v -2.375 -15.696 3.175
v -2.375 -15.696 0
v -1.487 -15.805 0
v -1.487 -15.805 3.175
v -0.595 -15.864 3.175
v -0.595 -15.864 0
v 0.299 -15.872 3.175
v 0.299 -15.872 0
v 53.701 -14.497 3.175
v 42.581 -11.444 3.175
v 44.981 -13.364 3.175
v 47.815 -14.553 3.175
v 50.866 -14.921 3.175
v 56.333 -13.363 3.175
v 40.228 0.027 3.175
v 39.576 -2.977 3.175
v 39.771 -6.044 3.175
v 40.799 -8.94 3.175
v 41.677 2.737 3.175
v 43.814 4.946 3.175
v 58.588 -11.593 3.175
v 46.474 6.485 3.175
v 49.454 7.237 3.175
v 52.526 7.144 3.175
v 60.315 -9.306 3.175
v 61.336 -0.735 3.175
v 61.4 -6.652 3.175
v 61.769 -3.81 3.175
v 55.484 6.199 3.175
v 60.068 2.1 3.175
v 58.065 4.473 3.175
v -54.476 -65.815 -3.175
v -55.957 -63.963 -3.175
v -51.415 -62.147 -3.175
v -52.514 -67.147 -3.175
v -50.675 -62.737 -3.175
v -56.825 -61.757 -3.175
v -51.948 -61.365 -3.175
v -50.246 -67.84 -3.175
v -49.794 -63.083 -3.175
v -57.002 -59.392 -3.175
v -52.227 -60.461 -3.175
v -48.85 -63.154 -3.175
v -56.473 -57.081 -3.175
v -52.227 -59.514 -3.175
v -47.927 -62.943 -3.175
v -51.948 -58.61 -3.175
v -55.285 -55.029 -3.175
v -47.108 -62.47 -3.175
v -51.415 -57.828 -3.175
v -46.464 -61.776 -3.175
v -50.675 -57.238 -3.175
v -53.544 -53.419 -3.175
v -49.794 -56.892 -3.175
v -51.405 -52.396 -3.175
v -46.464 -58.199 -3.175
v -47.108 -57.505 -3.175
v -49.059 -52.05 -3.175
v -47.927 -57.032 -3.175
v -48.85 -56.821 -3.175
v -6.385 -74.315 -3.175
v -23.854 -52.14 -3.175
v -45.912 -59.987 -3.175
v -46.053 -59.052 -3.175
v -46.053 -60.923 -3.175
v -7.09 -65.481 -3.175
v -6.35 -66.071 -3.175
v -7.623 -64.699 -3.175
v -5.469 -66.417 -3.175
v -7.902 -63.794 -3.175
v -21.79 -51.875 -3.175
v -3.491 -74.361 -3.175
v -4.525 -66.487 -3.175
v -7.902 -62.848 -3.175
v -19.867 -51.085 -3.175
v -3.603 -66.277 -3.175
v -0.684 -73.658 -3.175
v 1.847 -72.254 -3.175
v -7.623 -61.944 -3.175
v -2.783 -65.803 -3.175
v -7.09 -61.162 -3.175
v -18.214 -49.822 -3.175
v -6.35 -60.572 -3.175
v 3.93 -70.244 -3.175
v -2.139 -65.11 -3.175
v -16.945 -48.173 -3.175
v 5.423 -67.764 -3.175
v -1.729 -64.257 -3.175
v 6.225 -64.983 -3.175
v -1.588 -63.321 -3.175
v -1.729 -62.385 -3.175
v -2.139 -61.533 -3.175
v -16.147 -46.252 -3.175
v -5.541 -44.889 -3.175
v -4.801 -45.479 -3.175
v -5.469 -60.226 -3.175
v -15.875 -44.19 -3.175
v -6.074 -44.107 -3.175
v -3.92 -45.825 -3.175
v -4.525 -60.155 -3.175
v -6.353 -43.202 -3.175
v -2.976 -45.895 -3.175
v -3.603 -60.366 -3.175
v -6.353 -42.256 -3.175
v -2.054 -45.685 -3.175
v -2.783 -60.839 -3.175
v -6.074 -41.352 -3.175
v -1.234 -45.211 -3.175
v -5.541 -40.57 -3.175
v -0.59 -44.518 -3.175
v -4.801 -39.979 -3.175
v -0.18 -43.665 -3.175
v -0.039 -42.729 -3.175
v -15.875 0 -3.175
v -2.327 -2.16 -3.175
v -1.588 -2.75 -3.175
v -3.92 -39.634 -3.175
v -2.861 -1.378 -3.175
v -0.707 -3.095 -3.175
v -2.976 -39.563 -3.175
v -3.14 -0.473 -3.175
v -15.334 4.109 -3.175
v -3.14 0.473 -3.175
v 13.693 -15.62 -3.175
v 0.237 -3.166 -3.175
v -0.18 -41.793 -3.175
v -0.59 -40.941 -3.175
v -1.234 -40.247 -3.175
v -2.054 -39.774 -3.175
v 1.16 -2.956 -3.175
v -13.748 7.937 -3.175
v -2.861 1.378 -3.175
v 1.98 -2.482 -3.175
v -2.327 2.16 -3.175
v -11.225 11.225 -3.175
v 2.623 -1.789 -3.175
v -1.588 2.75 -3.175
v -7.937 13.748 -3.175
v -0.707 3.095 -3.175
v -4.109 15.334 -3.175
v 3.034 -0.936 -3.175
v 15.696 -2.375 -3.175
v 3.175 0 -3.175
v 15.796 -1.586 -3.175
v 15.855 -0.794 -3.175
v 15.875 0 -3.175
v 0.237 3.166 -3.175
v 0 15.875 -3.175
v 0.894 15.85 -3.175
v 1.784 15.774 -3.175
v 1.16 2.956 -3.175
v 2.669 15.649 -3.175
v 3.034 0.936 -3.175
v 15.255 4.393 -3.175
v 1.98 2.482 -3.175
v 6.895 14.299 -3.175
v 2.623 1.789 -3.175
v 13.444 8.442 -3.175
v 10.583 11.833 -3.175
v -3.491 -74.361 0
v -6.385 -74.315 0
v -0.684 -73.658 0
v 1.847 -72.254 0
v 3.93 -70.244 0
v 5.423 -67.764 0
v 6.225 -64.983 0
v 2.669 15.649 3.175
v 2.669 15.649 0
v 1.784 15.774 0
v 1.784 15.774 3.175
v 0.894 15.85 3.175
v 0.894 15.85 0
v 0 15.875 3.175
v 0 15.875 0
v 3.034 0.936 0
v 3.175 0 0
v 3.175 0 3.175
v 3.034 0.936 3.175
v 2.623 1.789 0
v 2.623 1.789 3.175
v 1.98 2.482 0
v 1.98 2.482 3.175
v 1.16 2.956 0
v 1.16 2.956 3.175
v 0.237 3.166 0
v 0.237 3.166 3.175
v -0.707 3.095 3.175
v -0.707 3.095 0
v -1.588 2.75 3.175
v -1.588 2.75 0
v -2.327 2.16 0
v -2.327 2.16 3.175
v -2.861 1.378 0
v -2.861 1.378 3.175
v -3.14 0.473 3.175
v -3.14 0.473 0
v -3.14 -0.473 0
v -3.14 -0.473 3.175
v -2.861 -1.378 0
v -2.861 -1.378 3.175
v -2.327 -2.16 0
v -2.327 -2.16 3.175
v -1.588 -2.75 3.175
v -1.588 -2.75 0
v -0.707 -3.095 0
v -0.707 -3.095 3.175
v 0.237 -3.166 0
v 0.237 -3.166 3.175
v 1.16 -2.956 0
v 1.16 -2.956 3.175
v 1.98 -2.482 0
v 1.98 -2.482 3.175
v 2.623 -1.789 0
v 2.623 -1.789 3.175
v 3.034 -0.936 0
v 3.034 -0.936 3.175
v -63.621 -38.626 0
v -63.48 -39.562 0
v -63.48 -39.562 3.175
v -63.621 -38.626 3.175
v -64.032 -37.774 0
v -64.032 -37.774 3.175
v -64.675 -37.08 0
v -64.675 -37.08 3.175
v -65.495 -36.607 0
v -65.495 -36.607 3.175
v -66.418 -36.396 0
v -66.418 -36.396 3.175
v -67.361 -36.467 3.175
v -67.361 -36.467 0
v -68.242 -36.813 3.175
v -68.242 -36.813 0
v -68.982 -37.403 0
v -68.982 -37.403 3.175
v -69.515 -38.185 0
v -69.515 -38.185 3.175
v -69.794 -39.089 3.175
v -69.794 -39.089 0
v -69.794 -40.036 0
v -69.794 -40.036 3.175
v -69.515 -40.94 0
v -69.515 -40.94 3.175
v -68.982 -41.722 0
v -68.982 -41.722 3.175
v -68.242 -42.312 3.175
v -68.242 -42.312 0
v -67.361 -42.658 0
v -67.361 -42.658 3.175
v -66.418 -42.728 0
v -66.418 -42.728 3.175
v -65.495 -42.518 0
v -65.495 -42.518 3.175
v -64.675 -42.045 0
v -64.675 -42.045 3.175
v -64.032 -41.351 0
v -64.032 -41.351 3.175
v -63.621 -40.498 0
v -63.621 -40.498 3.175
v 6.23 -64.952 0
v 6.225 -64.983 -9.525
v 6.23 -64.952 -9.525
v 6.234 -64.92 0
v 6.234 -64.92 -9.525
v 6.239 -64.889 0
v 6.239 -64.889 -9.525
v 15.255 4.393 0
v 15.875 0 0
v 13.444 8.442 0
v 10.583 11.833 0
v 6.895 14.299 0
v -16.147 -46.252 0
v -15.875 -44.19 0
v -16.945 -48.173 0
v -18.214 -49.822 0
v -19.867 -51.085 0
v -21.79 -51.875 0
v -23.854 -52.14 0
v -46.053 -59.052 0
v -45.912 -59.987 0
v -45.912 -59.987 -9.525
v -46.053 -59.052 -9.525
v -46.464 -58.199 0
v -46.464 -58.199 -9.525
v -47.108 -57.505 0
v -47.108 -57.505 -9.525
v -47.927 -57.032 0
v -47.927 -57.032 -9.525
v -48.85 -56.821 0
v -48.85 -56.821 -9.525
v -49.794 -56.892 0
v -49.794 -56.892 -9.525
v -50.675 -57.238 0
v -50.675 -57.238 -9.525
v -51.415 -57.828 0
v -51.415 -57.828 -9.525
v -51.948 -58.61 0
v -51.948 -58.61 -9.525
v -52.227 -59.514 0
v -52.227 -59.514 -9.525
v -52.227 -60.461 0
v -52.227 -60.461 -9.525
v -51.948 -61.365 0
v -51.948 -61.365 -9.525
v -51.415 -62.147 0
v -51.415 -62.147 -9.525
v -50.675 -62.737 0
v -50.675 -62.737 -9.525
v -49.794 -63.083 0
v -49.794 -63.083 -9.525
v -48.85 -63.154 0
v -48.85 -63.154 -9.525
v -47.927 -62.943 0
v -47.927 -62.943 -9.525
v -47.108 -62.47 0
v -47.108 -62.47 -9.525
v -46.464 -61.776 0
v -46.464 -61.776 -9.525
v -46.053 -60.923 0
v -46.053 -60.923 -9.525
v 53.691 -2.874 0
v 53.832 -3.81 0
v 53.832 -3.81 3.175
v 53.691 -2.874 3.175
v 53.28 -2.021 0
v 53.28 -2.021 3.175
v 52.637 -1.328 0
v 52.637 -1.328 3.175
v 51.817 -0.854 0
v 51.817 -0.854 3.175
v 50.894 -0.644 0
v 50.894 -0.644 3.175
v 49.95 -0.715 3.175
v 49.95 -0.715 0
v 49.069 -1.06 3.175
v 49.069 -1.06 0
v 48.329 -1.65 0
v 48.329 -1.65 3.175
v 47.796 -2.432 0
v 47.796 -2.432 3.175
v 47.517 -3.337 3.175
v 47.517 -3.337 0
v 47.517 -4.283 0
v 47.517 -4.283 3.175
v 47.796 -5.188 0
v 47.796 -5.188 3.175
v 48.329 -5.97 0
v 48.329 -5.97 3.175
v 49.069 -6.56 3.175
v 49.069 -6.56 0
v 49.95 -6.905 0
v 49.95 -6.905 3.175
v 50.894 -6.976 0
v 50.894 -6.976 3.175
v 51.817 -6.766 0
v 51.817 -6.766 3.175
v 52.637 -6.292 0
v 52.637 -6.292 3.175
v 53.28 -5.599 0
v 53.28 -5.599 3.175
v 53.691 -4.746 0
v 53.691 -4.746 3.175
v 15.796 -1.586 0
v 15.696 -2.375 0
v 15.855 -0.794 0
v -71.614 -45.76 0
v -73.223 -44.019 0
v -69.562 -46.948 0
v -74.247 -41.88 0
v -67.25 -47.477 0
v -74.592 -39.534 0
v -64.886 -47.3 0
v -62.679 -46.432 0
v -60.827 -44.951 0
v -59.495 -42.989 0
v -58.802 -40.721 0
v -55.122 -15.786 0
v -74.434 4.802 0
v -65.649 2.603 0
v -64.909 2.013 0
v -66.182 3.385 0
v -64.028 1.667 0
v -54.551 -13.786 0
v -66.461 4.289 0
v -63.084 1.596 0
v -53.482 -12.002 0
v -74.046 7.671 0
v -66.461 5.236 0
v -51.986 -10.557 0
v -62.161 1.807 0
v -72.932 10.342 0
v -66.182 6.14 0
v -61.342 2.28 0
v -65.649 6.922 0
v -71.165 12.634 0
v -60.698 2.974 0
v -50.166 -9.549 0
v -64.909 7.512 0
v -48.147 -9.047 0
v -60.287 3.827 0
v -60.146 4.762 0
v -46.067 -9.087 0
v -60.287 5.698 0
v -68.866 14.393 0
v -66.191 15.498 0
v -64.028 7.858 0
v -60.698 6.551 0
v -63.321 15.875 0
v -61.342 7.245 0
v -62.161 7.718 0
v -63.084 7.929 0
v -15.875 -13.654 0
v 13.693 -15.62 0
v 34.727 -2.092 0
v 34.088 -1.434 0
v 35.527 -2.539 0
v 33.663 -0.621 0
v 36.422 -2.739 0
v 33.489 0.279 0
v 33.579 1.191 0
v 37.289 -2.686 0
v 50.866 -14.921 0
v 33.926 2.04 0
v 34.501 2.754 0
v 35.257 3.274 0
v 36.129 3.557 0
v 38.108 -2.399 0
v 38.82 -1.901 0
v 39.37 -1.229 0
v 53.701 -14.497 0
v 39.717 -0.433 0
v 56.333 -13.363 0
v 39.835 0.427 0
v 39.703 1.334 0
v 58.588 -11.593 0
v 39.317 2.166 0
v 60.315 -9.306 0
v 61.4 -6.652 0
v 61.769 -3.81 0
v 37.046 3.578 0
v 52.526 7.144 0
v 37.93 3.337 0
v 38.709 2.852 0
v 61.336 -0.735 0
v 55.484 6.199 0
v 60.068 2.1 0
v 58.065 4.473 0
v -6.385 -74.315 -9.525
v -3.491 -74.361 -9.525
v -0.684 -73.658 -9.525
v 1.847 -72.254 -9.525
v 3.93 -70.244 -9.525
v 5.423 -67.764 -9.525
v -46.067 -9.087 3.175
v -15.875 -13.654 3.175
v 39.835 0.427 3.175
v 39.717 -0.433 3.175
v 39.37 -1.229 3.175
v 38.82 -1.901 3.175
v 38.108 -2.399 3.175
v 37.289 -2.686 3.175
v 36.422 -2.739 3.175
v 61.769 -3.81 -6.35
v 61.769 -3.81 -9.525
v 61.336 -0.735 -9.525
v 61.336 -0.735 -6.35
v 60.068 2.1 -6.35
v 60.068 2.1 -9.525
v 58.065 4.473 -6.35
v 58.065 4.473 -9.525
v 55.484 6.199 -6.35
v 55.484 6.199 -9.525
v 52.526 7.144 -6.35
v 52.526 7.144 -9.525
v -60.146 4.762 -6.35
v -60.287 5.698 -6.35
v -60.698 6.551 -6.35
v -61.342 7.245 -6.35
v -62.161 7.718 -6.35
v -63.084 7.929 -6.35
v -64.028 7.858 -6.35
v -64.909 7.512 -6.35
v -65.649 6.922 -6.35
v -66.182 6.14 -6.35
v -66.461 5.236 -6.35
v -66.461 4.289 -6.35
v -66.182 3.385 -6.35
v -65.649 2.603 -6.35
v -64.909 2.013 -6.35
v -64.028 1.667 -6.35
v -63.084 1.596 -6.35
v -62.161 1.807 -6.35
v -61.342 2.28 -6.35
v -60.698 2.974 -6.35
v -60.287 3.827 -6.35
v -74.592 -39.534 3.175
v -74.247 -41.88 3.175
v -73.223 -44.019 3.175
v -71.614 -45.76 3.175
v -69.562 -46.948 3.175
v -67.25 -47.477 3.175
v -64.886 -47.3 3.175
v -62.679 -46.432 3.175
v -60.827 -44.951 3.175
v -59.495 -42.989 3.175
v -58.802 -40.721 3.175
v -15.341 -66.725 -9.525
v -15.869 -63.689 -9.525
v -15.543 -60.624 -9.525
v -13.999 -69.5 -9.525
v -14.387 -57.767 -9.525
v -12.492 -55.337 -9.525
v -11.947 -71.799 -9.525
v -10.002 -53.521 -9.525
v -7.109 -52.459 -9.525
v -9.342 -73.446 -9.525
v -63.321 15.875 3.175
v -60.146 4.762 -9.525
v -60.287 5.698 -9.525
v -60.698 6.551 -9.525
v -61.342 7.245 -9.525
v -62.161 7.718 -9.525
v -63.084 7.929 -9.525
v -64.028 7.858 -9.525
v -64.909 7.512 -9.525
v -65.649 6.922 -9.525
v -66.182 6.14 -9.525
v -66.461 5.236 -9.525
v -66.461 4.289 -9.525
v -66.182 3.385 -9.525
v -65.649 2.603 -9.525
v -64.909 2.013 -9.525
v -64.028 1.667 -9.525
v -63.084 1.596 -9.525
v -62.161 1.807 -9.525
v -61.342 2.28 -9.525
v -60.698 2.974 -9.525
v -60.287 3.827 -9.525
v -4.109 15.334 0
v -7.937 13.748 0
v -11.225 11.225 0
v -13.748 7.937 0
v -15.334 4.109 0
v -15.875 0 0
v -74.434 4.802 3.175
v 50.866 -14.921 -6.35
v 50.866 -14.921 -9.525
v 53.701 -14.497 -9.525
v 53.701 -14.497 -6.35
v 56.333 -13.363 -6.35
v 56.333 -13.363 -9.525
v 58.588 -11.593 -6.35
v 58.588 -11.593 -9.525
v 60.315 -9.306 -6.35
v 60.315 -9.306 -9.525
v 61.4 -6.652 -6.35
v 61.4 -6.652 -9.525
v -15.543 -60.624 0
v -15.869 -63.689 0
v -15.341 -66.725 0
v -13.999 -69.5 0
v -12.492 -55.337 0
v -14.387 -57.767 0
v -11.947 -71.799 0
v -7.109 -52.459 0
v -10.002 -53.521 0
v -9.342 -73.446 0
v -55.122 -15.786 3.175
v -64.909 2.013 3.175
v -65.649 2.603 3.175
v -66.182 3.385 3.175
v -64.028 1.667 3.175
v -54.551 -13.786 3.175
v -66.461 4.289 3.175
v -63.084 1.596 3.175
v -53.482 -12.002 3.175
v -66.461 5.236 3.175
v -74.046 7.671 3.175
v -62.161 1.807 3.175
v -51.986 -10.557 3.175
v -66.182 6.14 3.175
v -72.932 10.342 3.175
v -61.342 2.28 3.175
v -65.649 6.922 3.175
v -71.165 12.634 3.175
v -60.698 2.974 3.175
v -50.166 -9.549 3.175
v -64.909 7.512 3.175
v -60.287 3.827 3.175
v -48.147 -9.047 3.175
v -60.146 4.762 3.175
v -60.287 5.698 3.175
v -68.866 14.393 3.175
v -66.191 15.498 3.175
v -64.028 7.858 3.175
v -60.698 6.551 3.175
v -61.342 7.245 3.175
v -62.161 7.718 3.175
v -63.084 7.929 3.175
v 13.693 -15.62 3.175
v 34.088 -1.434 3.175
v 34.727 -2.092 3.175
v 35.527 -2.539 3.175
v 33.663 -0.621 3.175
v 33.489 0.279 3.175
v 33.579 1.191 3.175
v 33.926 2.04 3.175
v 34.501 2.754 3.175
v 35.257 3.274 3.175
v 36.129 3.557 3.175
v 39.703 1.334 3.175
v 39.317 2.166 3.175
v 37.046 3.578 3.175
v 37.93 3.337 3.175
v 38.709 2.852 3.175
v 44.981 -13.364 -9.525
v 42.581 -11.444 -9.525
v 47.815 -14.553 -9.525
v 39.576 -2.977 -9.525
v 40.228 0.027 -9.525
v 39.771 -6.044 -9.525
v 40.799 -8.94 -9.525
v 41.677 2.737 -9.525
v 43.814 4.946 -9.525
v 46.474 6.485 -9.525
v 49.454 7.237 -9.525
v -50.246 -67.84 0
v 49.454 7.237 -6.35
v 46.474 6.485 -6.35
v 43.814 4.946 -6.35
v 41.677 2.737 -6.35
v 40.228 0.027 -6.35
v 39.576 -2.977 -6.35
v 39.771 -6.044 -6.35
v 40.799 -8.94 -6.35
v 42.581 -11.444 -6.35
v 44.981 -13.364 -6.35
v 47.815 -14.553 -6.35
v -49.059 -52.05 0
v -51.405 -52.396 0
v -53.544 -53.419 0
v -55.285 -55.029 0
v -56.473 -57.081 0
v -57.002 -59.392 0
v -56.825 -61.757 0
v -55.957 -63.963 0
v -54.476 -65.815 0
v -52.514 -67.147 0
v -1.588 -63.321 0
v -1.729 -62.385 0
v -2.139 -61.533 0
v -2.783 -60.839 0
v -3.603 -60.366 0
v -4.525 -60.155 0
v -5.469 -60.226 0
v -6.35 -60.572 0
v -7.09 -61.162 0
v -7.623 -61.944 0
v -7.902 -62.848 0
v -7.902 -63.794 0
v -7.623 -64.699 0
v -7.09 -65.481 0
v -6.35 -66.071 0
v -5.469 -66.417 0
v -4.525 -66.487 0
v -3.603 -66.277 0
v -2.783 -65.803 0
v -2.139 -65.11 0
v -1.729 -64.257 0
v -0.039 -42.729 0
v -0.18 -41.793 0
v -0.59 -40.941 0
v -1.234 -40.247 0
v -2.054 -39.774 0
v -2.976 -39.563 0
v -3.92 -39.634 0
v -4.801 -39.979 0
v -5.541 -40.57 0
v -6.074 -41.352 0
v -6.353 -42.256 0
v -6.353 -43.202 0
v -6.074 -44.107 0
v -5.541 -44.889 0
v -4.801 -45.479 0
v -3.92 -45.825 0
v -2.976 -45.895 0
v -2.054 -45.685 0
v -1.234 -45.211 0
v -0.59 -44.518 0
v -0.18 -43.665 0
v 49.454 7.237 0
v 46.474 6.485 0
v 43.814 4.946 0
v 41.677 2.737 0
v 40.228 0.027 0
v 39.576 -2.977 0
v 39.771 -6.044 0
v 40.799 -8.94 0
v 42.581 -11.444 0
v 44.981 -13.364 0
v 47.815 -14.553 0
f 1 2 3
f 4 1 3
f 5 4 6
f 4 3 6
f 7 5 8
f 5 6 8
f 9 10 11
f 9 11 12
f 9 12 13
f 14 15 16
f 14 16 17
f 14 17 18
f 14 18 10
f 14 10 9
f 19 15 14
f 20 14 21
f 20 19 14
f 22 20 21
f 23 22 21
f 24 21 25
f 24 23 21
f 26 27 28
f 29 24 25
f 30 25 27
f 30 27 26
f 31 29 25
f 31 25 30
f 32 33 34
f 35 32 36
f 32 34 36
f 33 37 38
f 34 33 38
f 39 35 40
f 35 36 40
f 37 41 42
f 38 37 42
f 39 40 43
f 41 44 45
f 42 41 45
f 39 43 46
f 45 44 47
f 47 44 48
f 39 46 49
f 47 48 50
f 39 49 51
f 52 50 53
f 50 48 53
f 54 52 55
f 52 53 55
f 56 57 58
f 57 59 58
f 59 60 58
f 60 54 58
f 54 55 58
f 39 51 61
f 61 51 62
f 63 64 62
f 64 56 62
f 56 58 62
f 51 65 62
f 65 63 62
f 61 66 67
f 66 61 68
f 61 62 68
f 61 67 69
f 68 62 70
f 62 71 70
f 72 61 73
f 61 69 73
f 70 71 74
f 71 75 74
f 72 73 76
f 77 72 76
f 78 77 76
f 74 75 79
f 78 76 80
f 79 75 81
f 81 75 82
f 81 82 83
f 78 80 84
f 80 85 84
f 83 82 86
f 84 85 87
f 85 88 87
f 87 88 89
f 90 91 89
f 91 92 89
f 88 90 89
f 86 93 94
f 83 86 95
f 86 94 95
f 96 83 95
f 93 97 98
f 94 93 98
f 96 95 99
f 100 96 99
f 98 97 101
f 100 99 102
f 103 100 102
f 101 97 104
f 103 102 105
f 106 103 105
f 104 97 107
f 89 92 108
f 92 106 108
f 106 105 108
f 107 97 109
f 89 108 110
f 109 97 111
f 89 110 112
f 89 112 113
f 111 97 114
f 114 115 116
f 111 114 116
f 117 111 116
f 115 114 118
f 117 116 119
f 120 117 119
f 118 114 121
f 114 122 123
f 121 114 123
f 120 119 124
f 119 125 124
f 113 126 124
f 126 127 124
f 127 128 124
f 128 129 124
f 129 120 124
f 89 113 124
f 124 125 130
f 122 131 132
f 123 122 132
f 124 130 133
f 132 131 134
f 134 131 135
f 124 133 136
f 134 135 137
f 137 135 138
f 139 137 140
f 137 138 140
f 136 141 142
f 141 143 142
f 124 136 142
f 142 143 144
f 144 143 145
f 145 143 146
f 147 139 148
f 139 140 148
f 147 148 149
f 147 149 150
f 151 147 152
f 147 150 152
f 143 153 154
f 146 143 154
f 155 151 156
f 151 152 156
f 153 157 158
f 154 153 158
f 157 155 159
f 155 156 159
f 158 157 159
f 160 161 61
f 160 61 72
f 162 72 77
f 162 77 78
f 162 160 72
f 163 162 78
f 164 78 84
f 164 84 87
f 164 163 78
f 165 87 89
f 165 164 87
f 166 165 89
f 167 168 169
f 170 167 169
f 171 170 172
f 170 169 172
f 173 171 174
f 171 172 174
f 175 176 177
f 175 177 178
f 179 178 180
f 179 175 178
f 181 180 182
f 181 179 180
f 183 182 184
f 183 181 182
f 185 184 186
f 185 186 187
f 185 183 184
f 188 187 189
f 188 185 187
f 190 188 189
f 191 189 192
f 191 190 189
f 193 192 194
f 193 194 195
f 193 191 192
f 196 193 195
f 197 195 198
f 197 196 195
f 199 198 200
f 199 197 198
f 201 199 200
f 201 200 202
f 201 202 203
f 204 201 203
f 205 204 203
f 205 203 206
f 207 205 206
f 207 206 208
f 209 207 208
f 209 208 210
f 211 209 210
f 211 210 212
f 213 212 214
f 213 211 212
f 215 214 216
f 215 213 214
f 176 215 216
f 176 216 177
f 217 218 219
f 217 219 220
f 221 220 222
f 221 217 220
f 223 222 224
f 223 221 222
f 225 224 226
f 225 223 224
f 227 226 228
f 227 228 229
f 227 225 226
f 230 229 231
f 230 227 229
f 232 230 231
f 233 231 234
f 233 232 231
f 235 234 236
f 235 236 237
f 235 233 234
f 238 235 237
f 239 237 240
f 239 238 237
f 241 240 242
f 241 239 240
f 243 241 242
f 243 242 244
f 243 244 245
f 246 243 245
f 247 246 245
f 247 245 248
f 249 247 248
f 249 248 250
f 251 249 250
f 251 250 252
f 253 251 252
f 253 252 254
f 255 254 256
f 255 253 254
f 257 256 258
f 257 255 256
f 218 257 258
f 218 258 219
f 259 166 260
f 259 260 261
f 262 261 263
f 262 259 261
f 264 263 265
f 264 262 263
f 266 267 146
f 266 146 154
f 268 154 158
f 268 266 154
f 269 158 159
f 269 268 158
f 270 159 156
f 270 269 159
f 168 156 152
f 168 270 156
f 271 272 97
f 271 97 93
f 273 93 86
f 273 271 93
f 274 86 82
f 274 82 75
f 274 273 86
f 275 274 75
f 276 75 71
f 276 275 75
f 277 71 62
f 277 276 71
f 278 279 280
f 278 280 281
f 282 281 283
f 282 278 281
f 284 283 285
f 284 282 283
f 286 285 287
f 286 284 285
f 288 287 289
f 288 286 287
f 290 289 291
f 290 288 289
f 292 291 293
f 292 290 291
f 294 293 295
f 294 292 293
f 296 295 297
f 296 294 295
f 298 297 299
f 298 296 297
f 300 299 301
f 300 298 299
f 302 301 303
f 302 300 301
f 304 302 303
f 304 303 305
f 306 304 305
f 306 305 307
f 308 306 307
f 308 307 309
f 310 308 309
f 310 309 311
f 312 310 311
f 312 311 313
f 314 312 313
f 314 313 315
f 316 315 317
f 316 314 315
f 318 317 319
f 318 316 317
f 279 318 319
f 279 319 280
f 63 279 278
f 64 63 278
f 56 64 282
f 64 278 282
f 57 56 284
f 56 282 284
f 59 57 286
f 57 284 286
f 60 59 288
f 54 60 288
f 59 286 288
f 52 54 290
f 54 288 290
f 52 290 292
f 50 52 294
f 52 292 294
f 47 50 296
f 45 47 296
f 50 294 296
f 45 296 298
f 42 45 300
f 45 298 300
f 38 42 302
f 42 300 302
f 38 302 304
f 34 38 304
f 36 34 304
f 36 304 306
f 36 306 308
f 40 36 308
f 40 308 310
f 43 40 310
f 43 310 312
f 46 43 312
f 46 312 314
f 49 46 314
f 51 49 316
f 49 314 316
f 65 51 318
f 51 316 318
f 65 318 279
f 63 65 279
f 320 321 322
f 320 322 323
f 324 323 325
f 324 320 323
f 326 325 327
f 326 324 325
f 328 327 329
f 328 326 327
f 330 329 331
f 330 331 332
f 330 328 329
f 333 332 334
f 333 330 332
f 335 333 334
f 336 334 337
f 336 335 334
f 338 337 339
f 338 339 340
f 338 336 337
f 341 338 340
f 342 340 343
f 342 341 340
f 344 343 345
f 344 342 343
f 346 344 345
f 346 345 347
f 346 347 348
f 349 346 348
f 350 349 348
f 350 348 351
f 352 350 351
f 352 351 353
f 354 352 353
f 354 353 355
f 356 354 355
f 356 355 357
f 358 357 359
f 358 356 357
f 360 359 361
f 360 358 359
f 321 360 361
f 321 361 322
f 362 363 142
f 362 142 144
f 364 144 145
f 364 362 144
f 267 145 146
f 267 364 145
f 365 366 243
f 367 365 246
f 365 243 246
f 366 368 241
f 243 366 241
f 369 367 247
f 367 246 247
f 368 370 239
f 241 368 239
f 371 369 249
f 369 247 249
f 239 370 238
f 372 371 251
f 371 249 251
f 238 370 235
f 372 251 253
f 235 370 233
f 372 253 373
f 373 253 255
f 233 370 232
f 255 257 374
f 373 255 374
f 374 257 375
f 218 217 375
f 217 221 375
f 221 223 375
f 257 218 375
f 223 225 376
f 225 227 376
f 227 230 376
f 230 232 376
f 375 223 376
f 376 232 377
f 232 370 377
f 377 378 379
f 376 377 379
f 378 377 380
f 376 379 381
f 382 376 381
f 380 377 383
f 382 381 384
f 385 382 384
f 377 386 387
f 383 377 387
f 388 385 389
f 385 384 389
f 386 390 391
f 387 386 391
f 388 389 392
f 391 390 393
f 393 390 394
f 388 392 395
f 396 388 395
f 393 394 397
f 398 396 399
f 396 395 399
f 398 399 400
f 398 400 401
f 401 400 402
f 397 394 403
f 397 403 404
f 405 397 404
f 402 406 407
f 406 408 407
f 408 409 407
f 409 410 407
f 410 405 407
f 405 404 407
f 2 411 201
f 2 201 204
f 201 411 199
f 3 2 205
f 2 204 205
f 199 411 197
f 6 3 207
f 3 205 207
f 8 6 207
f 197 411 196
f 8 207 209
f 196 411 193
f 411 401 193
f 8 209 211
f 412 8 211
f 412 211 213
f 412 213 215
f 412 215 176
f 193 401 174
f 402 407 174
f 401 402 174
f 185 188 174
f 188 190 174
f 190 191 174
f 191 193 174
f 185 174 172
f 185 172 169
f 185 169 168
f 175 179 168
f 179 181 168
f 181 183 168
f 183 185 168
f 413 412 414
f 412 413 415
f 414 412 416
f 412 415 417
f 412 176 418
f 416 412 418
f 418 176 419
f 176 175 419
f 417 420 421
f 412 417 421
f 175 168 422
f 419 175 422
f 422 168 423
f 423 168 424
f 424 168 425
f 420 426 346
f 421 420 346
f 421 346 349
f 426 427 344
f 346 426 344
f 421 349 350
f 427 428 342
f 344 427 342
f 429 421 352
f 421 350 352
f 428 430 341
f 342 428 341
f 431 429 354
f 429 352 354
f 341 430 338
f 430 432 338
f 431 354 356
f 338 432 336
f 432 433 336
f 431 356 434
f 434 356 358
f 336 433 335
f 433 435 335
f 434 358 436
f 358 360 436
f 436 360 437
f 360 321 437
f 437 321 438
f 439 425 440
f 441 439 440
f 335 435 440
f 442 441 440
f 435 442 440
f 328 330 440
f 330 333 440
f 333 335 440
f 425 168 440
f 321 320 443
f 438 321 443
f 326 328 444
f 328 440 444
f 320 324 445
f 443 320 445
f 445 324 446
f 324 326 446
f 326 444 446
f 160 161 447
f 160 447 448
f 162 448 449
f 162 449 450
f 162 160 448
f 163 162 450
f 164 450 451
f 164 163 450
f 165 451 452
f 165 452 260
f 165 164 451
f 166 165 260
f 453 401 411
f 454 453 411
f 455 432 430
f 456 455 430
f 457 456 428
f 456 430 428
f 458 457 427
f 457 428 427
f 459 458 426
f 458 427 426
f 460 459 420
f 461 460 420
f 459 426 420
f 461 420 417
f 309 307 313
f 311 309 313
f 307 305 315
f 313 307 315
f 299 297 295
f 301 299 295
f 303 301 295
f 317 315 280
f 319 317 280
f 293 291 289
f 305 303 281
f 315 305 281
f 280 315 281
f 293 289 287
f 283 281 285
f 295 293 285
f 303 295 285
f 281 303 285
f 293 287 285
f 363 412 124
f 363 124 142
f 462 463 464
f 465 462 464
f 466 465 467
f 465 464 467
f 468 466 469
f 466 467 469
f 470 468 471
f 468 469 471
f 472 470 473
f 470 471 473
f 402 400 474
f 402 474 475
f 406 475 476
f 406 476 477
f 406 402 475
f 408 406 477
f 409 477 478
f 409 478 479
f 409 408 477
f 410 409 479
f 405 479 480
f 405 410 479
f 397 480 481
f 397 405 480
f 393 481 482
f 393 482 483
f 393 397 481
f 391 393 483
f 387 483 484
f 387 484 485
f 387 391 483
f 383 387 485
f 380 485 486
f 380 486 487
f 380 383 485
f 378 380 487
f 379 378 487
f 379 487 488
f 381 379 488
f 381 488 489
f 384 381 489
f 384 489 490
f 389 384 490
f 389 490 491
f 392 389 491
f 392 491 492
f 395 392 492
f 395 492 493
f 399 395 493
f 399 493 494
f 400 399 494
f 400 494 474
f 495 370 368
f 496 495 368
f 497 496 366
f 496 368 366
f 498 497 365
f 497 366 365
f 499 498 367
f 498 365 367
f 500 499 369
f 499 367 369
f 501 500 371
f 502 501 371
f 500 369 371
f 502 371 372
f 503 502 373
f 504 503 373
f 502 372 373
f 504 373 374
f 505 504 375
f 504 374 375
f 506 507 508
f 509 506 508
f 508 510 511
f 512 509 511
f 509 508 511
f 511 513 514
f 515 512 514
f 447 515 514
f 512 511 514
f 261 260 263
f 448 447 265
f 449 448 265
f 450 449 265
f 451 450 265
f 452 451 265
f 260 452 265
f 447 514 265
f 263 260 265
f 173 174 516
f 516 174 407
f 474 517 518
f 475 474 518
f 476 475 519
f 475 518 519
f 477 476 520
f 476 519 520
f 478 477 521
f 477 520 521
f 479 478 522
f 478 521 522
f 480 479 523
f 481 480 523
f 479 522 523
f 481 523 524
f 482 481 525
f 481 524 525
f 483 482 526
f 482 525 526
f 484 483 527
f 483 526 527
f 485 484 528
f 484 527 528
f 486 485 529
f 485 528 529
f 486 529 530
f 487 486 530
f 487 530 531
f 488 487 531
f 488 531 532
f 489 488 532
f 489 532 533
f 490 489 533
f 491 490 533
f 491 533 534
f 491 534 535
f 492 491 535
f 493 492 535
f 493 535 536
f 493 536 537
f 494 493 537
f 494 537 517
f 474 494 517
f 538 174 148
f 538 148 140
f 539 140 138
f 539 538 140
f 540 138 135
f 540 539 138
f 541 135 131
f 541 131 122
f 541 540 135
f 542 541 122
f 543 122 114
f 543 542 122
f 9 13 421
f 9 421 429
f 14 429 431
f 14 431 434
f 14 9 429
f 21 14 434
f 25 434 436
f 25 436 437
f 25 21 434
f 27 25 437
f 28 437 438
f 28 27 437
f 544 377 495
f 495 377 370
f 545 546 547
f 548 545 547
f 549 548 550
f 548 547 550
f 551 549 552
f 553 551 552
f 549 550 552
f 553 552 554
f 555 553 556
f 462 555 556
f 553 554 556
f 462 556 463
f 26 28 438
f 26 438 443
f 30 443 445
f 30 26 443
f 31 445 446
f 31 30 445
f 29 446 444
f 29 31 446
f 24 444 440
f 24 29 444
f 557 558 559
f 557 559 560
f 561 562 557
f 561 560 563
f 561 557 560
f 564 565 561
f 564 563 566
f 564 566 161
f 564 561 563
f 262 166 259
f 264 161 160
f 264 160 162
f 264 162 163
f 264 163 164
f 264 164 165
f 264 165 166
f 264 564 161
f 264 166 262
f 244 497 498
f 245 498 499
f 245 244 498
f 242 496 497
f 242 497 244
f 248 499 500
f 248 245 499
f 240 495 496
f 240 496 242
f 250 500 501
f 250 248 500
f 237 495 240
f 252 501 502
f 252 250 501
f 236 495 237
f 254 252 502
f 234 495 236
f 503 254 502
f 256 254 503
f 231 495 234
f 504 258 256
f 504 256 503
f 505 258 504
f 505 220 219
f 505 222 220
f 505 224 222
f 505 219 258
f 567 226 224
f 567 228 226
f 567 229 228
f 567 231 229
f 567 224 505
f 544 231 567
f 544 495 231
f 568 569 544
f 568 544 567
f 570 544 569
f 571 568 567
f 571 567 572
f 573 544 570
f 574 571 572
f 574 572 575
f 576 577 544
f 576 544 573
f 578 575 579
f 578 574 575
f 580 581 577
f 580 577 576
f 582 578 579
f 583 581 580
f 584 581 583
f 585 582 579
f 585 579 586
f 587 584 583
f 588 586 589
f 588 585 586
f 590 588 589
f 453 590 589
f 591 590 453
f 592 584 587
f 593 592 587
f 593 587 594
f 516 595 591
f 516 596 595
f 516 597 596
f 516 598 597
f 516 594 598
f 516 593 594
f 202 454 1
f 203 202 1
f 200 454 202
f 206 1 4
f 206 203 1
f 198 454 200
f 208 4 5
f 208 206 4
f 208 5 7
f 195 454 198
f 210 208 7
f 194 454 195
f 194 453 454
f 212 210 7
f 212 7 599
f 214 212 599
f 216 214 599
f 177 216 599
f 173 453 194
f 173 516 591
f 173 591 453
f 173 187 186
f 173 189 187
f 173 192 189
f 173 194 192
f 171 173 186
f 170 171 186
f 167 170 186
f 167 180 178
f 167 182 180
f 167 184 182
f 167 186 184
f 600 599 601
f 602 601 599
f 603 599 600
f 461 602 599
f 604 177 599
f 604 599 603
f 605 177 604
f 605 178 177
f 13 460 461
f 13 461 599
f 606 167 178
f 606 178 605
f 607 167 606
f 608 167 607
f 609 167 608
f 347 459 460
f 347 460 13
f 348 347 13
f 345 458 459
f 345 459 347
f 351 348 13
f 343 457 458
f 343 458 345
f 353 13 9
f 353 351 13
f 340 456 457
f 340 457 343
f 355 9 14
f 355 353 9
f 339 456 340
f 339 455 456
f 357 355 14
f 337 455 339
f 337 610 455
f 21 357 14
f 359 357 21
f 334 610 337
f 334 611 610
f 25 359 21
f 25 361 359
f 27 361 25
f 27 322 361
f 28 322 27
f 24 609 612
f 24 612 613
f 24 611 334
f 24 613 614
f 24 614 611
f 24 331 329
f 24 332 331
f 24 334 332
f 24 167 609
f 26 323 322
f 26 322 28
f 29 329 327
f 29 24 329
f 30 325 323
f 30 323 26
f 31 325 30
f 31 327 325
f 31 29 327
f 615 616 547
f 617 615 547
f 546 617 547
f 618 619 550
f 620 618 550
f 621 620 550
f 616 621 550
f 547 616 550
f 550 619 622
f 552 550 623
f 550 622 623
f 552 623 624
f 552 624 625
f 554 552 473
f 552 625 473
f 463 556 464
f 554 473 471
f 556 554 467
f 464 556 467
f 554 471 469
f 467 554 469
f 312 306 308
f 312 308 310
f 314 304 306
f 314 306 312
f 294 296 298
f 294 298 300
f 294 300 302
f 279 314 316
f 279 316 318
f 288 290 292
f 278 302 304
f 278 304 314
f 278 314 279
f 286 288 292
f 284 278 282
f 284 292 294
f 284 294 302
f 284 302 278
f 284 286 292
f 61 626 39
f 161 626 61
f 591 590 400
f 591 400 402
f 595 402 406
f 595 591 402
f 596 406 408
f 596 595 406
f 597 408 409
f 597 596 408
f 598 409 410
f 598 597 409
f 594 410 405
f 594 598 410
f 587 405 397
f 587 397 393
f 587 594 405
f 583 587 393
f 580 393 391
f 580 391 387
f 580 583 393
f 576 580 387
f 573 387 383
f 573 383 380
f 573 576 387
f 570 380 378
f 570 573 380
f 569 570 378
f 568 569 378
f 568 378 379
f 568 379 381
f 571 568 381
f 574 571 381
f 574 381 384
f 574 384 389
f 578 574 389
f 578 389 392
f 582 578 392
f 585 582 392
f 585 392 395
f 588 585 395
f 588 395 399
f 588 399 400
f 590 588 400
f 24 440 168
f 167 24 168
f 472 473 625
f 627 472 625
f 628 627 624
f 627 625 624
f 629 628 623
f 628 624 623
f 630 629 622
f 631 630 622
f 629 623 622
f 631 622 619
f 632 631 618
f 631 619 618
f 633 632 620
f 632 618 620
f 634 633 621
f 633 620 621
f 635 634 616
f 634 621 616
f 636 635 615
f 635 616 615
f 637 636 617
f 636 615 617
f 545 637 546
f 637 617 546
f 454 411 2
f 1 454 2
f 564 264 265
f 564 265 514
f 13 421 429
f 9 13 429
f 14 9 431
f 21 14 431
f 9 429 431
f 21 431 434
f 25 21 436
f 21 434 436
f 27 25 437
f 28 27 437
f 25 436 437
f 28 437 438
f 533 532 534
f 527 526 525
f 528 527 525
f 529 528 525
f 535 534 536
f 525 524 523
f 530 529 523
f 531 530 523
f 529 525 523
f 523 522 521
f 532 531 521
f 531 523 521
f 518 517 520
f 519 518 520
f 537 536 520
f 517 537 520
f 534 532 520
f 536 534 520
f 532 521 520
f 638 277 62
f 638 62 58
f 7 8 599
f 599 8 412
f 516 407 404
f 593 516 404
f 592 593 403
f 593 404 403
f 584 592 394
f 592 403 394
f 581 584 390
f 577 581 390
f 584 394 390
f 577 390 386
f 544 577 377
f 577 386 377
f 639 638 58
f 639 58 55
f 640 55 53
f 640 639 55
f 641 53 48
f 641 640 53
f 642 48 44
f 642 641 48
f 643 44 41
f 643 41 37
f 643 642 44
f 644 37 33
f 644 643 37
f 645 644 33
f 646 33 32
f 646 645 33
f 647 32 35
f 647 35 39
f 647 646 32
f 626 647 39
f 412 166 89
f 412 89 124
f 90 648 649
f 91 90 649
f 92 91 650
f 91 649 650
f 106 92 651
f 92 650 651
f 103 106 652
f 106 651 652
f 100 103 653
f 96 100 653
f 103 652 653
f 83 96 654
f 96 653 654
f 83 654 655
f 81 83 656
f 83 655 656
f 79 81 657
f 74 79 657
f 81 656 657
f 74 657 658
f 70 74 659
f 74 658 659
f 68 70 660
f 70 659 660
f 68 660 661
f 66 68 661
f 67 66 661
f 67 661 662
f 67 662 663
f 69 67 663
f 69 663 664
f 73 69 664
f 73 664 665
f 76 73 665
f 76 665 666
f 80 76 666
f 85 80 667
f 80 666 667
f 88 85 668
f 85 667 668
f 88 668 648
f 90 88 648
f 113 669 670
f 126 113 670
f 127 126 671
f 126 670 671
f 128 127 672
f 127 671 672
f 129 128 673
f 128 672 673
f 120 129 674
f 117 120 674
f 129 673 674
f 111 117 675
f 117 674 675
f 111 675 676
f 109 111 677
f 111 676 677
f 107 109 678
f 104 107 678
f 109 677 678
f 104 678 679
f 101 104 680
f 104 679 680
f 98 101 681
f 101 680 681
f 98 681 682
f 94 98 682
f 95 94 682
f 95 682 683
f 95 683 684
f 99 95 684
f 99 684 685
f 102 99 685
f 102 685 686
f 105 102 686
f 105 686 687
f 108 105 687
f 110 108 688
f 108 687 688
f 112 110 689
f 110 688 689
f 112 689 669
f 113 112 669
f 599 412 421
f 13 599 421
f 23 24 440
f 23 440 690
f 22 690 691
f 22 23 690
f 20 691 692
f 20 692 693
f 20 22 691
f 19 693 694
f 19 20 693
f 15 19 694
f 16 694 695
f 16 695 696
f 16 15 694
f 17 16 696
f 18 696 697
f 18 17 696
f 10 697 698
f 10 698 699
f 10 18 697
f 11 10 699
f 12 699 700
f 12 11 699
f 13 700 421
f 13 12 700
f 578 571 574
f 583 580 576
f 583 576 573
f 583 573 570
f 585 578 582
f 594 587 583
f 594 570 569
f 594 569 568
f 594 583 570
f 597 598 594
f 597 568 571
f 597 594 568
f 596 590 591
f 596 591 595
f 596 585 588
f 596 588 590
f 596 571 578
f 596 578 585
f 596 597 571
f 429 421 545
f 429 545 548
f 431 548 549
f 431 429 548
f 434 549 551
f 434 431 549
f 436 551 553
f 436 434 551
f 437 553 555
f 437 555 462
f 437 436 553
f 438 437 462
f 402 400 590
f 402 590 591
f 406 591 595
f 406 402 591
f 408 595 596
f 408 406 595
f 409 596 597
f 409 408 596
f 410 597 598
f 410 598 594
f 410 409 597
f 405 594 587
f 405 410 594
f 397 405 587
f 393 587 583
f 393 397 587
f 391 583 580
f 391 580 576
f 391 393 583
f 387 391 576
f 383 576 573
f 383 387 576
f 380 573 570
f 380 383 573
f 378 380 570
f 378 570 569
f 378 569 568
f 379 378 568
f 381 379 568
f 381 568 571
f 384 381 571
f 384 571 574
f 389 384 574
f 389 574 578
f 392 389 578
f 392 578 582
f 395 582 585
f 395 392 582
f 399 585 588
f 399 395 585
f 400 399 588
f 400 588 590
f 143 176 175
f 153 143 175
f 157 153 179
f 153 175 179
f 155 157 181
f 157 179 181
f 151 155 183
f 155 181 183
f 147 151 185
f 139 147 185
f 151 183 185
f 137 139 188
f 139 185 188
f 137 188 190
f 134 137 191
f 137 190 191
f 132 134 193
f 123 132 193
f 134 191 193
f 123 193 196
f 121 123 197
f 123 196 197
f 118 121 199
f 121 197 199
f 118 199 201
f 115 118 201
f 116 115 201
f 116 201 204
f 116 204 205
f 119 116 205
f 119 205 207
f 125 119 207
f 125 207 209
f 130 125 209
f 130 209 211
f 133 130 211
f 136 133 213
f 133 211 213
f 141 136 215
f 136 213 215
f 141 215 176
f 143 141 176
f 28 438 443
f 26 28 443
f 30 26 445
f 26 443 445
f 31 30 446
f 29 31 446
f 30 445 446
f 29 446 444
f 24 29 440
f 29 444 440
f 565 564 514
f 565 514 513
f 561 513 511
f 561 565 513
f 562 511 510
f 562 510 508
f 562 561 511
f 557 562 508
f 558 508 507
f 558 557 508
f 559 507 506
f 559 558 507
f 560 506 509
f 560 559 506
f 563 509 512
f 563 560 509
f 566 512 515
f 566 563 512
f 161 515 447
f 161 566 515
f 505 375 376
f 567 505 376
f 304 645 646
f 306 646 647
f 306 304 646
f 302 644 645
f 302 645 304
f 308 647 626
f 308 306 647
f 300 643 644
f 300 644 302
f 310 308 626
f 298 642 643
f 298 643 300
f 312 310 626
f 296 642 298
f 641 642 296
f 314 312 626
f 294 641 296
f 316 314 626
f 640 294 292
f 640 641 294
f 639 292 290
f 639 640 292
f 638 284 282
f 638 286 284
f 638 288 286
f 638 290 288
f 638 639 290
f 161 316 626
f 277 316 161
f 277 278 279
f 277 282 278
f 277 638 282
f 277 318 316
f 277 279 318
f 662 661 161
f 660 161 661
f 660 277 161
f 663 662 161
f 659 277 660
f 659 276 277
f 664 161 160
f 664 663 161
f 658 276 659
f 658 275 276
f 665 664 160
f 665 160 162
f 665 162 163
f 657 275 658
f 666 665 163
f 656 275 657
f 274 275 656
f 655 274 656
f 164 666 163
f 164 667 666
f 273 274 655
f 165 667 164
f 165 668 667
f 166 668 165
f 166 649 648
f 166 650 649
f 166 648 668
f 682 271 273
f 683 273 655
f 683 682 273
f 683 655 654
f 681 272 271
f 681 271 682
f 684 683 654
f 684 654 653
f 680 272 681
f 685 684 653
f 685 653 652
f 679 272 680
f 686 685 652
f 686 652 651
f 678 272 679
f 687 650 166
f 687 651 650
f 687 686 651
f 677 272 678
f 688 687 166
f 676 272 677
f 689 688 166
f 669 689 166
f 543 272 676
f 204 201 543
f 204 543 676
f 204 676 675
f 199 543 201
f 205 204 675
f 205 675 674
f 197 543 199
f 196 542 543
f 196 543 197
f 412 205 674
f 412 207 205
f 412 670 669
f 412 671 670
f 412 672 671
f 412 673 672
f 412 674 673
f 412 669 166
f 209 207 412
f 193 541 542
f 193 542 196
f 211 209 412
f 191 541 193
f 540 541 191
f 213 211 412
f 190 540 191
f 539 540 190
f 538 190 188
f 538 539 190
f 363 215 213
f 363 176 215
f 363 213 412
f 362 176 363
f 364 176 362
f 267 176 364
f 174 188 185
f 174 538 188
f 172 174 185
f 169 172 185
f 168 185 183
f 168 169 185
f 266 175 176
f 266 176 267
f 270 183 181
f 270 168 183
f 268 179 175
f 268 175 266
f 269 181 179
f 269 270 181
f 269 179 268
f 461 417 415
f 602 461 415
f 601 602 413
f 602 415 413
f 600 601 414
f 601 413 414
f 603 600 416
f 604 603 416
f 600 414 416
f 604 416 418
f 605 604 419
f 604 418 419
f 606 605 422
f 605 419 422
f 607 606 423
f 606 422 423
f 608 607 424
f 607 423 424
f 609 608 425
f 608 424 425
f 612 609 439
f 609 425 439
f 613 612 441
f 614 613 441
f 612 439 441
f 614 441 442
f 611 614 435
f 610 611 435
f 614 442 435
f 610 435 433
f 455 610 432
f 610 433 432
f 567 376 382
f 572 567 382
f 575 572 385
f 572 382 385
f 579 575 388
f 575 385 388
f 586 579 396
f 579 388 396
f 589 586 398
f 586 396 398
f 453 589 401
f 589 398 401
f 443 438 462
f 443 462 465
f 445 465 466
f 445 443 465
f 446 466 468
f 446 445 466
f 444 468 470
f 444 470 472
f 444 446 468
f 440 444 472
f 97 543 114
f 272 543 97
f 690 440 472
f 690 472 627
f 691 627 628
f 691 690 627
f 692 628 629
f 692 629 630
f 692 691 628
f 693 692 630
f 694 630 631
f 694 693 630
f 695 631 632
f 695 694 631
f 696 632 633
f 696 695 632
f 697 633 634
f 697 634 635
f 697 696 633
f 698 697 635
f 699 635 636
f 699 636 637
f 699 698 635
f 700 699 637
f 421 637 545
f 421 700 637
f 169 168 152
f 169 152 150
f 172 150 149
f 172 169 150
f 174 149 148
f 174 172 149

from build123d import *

# Parameters (mm, degrees)
F0_R     = 3.175
F1_DEPTH = 3.175
F2_DEPTH = 3.175
F4_R     = 3.175
F6_DEPTH = 9.525
F3_R     = 3.175


# Not quite as in the source:
# - a pattern or mirror of a feature is missing from the dataset's text; its kind, count and spacing are read off the source's solid


with BuildPart() as f1:
    # F0 (on Top) → F1 (new body)
    with BuildSketch(Plane.XY):
        with BuildLine():
            ThreePointArc((-15.875, 0), (-11.2253201513, 11.2253201513), (0, 15.875))
            Line((0, 15.875), (-63.3211543937, 15.875))
            ThreePointArc((-63.3211543937, 15.875), (-55.4634302878, 12.6202241059), (-52.2086543937, 4.7625))
            ThreePointArc((-52.2086543937, 4.7625), (-63.3410515432, -6.3499821869), (-74.4335831412, 4.8022942352))
            Line((-74.4335831412, 4.8022942352), (-74.5923534991, -39.5338836219))
            ThreePointArc((-74.5923534991, -39.5338836219), (-66.6406921441, -31.6248207993), (-58.7174043937, -39.5623080756))
            ThreePointArc((-58.7174043937, -39.5623080756), (-58.7387068636, -40.1434474), (-58.8024999312, -40.7214674292))
            Line((-58.8024999312, -40.7214674292), (-55.1216121776, -15.7863113327))
            ThreePointArc((-55.1216121776, -15.7863113327), (-51.9856201231, -10.5565144679), (-46.0674725884, -9.0865650912))
            Line((-46.0674725884, -9.0865650912), (-15.875, -13.6540649408))
            Line((-15.875, -13.6540649408), (-15.875, 0))
        make_face()
        with BuildLine():
            ThreePointArc((-52.2086543937, 4.7625), (-55.4634302878, 12.6202241059), (-63.3211543937, 15.875))
            ThreePointArc((-63.3211543937, 15.875), (-71.1647964945, 12.6342809195), (-74.4335831412, 4.8022942352))
            ThreePointArc((-74.4335831412, 4.8022942352), (-63.3410515432, -6.3499821869), (-52.2086543937, 4.7625))
        make_face()
        with Locations((-63.3211543937, 4.7625)):
            Circle(F0_R, mode=Mode.SUBTRACT)
        with BuildLine():
            ThreePointArc((15.69640625, -2.3745432898), (15.8302885984, -1.190625), (15.875, 0))
            ThreePointArc((15.875, 0), (12.1324662265, 10.238109604), (2.6694707699, 15.6489472748))
            ThreePointArc((2.6694707699, 15.6489472748), (1.3395124137, 15.8183858688), (0, 15.875))
            ThreePointArc((0, 15.875), (-11.2253201513, 11.2253201513), (-15.875, 0))
            ThreePointArc((-15.875, 0), (-12.0356034274, -10.3518054047), (-2.3745432898, -15.69640625))
            ThreePointArc((-2.3745432898, -15.69640625), (-1.0416321888, -15.8407899861), (0.2987083423, -15.8721894623))
            ThreePointArc((0.2987083423, -15.8721894623), (10.4645848343, -11.9376752027), (15.69640625, -2.3745432898))
        make_face()
        Circle(F0_R, mode=Mode.SUBTRACT)
        with BuildLine():
            ThreePointArc((61.769423515, -3.81), (59.1496498735, 3.3566767228), (52.5255530539, 7.1442630923))
            ThreePointArc((52.5255530539, 7.1442630923), (39.5757214961, -2.9765625), (50.8660193546, -14.9205326236))
            ThreePointArc((50.8660193546, -14.9205326236), (58.5882296422, -11.5934464966), (61.769423515, -3.81))
        make_face()
        with Locations((50.656923515, -3.81)):
            Circle(F0_R, mode=Mode.SUBTRACT)
        with BuildLine():
            ThreePointArc((2.6694707699, 15.6489472748), (12.1324662265, 10.238109604), (15.875, 0))
            ThreePointArc((15.875, 0), (15.8302885984, -1.190625), (15.69640625, -2.3745432898))
            Line((15.69640625, -2.3745432898), (13.6926228472, -15.6201212767))
            Line((13.6926228472, -15.6201212767), (50.8660193546, -14.9205326236))
            ThreePointArc((50.8660193546, -14.9205326236), (39.5757214961, -2.9765625), (52.5255530539, 7.1442630923))
            Line((52.5255530539, 7.1442630923), (2.6694707699, 15.6489472748))
        make_face()
        with BuildLine():
            ThreePointArc((36.4223280073, -2.73939), (34.501219564, 2.7543996496), (39.8354530073, 0.4266677197))
            ThreePointArc((39.8354530073, 0.4266677197), (38.8196864505, -1.9010642102), (36.4223280073, -2.73939))
        make_face(mode=Mode.SUBTRACT)
        with BuildLine():
            Line((13.6926228472, -15.6201212767), (15.69640625, -2.3745432898))
            ThreePointArc((15.69640625, -2.3745432898), (10.4645848343, -11.9376752027), (0.2987083423, -15.8721894623))
            Line((0.2987083423, -15.8721894623), (13.6926228472, -15.6201212767))
        make_face()
        with BuildLine():
            ThreePointArc((-2.3745432898, -15.69640625), (-12.0356034274, -10.3518054047), (-15.875, 0))
            Line((-15.875, 0), (-15.875, -13.6540649408))
            Line((-15.875, -13.6540649408), (-2.3745432898, -15.69640625))
        make_face()
        with BuildLine():
            ThreePointArc((-58.7174043937, -39.5623080756), (-66.6406921441, -31.6248207993), (-74.5923534991, -39.5338836219))
            ThreePointArc((-74.5923534991, -39.5338836219), (-67.2502168937, -47.4774523748), (-58.8024999312, -40.7214674292))
            ThreePointArc((-58.8024999312, -40.7214674292), (-58.7387068636, -40.1434474), (-58.7174043937, -39.5623080756))
        make_face()
        with Locations((-66.6549043937, -39.5623080756)):
            Circle(F0_R, mode=Mode.SUBTRACT)
    extrude(amount=F1_DEPTH)


with BuildPart() as f2:
    # F0 (on Top) → F2 (new body)
    with BuildSketch(Plane.XY):
        with BuildLine():
            Line((13.6926228472, -15.6201212767), (0.2987083423, -15.8721894623))
            ThreePointArc((0.2987083423, -15.8721894623), (-1.0416321888, -15.8407899861), (-2.3745432898, -15.69640625))
            Line((-2.3745432898, -15.69640625), (-15.875, -13.6540649408))
            Line((-15.875, -13.6540649408), (-15.875, -44.1900675587))
            ThreePointArc((-15.875, -44.1900675587), (-18.213634337, -49.8217645365), (-23.8536699328, -52.1402165826))
            Line((-23.8536699328, -52.1402165826), (-49.0588836219, -52.0499552883))
            ThreePointArc((-49.0588836219, -52.0499552883), (-43.4646074188, -54.3848028931), (-41.1498080756, -59.9874043937))
            ThreePointArc((-41.1498080756, -59.9874043937), (-43.9006386779, -65.9959289055), (-50.2464674292, -67.8398088562))
            Line((-50.2464674292, -67.8398088562), (-6.385323095, -74.3145206412))
            ThreePointArc((-6.385323095, -74.3145206412), (-12.0238371567, -54.9092200771), (6.35, -63.3211543937))
            ThreePointArc((6.35, -63.3211543937), (6.3187020189, -64.1545918937), (6.224984375, -64.9833346965))
            Line((6.224984375, -64.9833346965), (13.6926228472, -15.6201212767))
        make_face()
        with Locations((-3.213735, -42.7291149849)):
            Circle(F0_R, mode=Mode.SUBTRACT)
        with BuildLine():
            ThreePointArc((-49.0588836219, -52.0499552883), (-57.0024523748, -59.3920918937), (-50.2464674292, -67.8398088562))
            ThreePointArc((-50.2464674292, -67.8398088562), (-43.9006386779, -65.9959289055), (-41.1498080756, -59.9874043937))
            ThreePointArc((-41.1498080756, -59.9874043937), (-43.4646074188, -54.3848028931), (-49.0588836219, -52.0499552883))
        make_face()
        with Locations((-49.0873080756, -59.9874043937)):
            Circle(F0_R, mode=Mode.SUBTRACT)
        with BuildLine():
            ThreePointArc((-6.385323095, -74.3145206412), (1.847490772, -72.253997068), (6.224984375, -64.9833346965))
            ThreePointArc((6.224984375, -64.9833346965), (6.3187020189, -64.1545918937), (6.35, -63.3211543937))
            ThreePointArc((6.35, -63.3211543937), (-12.0238371567, -54.9092200771), (-6.385323095, -74.3145206412))
        make_face()
        with Locations((-4.7625, -63.3211543937)):
            Circle(F0_R, mode=Mode.SUBTRACT)
        with BuildLine():
            ThreePointArc((15.69640625, -2.3745432898), (15.8302885984, -1.190625), (15.875, 0))
            ThreePointArc((15.875, 0), (12.1324662265, 10.238109604), (2.6694707699, 15.6489472748))
            ThreePointArc((2.6694707699, 15.6489472748), (1.3395124137, 15.8183858688), (0, 15.875))
            ThreePointArc((0, 15.875), (-11.2253201513, 11.2253201513), (-15.875, 0))
            ThreePointArc((-15.875, 0), (-12.0356034274, -10.3518054047), (-2.3745432898, -15.69640625))
            ThreePointArc((-2.3745432898, -15.69640625), (-1.0416321888, -15.8407899861), (0.2987083423, -15.8721894623))
            ThreePointArc((0.2987083423, -15.8721894623), (10.4645848343, -11.9376752027), (15.69640625, -2.3745432898))
        make_face()
        Circle(F0_R, mode=Mode.SUBTRACT)
        with BuildLine():
            Line((13.6926228472, -15.6201212767), (15.69640625, -2.3745432898))
            ThreePointArc((15.69640625, -2.3745432898), (10.4645848343, -11.9376752027), (0.2987083423, -15.8721894623))
            Line((0.2987083423, -15.8721894623), (13.6926228472, -15.6201212767))
        make_face()
        with BuildLine():
            ThreePointArc((-2.3745432898, -15.69640625), (-12.0356034274, -10.3518054047), (-15.875, 0))
            Line((-15.875, 0), (-15.875, -13.6540649408))
            Line((-15.875, -13.6540649408), (-2.3745432898, -15.69640625))
        make_face()
    extrude(amount=-F2_DEPTH)


with BuildPart() as f6:
    # F4 (on face) → F6 (new body, through all)
    with BuildSketch(Plane.XY):
        with Locations((-49.0873080756, -59.9874043937)):
            Circle(F4_R)
    extrude(amount=-F6_DEPTH)


with BuildPart() as f6b:
    # F4 (on face) → F6, piece 2 (new body, through all)
    with BuildSketch(Plane.XY):
        with BuildLine():
            ThreePointArc((-7.1087737889, -52.4591722745), (-15.8689168649, -63.6887964396), (-6.385323095, -74.3145206412))
            ThreePointArc((-6.385323095, -74.3145206412), (1.847490772, -72.253997068), (6.224984375, -64.9833346965))
            ThreePointArc((6.224984375, -64.9833346965), (6.232010065, -64.9362100216), (6.2388336409, -64.8890556569))
            Line((6.2388336409, -64.8890556569), (-7.1087737889, -52.4591722745))
        make_face()
        with Locations((-4.7625, -63.3211543937)):
            Circle(F4_R, mode=Mode.SUBTRACT)
        with Locations((-4.7625, -63.3211543937)):
            Circle(F4_R)
    extrude(amount=-F6_DEPTH)


with BuildPart() as f6c:
    # F3 (on face) → F6, piece 3 (new body, through all)
    with BuildSketch(Plane.XY.offset(3.175)):
        with Locations((-63.3211543937, 4.7625)):
            Circle(F3_R)
    extrude(amount=-F6_DEPTH)

    # F6_3_copies: F6c across plane


with BuildPart() as f6d:
    # F3 (on face) → F6, piece 4 (new body, through all)
    with BuildSketch(Plane.XY.offset(3.175)):
        with BuildLine():
            ThreePointArc((50.8660193546, -14.9205326236), (58.5882296422, -11.5934464966), (61.769423515, -3.81))
            ThreePointArc((61.769423515, -3.81), (59.1496498735, 3.3566767228), (52.5255530539, 7.1442630923))
            ThreePointArc((52.5255530539, 7.1442630923), (39.5757214961, -2.9765625), (50.8660193546, -14.9205326236))
        make_face()
        with Locations((50.656923515, -3.81)):
            Circle(F3_R, mode=Mode.SUBTRACT)
        with Locations((50.656923515, -3.81)):
            Circle(F3_R)
    extrude(amount=-F6_DEPTH)

    # F6_4_copies: F6d across plane


with BuildPart() as f6c_1:
    add(f6c.part)
    add(f6c.part.mirror(Plane(origin=(0, 0, -3.175), x_dir=(-1, 0, 0), z_dir=(0, 0, -1))))


with BuildPart() as f6d_1:
    add(f6d.part)
    add(f6d.part.mirror(Plane(origin=(0, 0, -3.175), x_dir=(-1, 0, 0), z_dir=(0, 0, -1))))


solid = Compound([f1.part, f2.part, f6.part, f6b.part, f6c_1.part, f6d_1.part])
